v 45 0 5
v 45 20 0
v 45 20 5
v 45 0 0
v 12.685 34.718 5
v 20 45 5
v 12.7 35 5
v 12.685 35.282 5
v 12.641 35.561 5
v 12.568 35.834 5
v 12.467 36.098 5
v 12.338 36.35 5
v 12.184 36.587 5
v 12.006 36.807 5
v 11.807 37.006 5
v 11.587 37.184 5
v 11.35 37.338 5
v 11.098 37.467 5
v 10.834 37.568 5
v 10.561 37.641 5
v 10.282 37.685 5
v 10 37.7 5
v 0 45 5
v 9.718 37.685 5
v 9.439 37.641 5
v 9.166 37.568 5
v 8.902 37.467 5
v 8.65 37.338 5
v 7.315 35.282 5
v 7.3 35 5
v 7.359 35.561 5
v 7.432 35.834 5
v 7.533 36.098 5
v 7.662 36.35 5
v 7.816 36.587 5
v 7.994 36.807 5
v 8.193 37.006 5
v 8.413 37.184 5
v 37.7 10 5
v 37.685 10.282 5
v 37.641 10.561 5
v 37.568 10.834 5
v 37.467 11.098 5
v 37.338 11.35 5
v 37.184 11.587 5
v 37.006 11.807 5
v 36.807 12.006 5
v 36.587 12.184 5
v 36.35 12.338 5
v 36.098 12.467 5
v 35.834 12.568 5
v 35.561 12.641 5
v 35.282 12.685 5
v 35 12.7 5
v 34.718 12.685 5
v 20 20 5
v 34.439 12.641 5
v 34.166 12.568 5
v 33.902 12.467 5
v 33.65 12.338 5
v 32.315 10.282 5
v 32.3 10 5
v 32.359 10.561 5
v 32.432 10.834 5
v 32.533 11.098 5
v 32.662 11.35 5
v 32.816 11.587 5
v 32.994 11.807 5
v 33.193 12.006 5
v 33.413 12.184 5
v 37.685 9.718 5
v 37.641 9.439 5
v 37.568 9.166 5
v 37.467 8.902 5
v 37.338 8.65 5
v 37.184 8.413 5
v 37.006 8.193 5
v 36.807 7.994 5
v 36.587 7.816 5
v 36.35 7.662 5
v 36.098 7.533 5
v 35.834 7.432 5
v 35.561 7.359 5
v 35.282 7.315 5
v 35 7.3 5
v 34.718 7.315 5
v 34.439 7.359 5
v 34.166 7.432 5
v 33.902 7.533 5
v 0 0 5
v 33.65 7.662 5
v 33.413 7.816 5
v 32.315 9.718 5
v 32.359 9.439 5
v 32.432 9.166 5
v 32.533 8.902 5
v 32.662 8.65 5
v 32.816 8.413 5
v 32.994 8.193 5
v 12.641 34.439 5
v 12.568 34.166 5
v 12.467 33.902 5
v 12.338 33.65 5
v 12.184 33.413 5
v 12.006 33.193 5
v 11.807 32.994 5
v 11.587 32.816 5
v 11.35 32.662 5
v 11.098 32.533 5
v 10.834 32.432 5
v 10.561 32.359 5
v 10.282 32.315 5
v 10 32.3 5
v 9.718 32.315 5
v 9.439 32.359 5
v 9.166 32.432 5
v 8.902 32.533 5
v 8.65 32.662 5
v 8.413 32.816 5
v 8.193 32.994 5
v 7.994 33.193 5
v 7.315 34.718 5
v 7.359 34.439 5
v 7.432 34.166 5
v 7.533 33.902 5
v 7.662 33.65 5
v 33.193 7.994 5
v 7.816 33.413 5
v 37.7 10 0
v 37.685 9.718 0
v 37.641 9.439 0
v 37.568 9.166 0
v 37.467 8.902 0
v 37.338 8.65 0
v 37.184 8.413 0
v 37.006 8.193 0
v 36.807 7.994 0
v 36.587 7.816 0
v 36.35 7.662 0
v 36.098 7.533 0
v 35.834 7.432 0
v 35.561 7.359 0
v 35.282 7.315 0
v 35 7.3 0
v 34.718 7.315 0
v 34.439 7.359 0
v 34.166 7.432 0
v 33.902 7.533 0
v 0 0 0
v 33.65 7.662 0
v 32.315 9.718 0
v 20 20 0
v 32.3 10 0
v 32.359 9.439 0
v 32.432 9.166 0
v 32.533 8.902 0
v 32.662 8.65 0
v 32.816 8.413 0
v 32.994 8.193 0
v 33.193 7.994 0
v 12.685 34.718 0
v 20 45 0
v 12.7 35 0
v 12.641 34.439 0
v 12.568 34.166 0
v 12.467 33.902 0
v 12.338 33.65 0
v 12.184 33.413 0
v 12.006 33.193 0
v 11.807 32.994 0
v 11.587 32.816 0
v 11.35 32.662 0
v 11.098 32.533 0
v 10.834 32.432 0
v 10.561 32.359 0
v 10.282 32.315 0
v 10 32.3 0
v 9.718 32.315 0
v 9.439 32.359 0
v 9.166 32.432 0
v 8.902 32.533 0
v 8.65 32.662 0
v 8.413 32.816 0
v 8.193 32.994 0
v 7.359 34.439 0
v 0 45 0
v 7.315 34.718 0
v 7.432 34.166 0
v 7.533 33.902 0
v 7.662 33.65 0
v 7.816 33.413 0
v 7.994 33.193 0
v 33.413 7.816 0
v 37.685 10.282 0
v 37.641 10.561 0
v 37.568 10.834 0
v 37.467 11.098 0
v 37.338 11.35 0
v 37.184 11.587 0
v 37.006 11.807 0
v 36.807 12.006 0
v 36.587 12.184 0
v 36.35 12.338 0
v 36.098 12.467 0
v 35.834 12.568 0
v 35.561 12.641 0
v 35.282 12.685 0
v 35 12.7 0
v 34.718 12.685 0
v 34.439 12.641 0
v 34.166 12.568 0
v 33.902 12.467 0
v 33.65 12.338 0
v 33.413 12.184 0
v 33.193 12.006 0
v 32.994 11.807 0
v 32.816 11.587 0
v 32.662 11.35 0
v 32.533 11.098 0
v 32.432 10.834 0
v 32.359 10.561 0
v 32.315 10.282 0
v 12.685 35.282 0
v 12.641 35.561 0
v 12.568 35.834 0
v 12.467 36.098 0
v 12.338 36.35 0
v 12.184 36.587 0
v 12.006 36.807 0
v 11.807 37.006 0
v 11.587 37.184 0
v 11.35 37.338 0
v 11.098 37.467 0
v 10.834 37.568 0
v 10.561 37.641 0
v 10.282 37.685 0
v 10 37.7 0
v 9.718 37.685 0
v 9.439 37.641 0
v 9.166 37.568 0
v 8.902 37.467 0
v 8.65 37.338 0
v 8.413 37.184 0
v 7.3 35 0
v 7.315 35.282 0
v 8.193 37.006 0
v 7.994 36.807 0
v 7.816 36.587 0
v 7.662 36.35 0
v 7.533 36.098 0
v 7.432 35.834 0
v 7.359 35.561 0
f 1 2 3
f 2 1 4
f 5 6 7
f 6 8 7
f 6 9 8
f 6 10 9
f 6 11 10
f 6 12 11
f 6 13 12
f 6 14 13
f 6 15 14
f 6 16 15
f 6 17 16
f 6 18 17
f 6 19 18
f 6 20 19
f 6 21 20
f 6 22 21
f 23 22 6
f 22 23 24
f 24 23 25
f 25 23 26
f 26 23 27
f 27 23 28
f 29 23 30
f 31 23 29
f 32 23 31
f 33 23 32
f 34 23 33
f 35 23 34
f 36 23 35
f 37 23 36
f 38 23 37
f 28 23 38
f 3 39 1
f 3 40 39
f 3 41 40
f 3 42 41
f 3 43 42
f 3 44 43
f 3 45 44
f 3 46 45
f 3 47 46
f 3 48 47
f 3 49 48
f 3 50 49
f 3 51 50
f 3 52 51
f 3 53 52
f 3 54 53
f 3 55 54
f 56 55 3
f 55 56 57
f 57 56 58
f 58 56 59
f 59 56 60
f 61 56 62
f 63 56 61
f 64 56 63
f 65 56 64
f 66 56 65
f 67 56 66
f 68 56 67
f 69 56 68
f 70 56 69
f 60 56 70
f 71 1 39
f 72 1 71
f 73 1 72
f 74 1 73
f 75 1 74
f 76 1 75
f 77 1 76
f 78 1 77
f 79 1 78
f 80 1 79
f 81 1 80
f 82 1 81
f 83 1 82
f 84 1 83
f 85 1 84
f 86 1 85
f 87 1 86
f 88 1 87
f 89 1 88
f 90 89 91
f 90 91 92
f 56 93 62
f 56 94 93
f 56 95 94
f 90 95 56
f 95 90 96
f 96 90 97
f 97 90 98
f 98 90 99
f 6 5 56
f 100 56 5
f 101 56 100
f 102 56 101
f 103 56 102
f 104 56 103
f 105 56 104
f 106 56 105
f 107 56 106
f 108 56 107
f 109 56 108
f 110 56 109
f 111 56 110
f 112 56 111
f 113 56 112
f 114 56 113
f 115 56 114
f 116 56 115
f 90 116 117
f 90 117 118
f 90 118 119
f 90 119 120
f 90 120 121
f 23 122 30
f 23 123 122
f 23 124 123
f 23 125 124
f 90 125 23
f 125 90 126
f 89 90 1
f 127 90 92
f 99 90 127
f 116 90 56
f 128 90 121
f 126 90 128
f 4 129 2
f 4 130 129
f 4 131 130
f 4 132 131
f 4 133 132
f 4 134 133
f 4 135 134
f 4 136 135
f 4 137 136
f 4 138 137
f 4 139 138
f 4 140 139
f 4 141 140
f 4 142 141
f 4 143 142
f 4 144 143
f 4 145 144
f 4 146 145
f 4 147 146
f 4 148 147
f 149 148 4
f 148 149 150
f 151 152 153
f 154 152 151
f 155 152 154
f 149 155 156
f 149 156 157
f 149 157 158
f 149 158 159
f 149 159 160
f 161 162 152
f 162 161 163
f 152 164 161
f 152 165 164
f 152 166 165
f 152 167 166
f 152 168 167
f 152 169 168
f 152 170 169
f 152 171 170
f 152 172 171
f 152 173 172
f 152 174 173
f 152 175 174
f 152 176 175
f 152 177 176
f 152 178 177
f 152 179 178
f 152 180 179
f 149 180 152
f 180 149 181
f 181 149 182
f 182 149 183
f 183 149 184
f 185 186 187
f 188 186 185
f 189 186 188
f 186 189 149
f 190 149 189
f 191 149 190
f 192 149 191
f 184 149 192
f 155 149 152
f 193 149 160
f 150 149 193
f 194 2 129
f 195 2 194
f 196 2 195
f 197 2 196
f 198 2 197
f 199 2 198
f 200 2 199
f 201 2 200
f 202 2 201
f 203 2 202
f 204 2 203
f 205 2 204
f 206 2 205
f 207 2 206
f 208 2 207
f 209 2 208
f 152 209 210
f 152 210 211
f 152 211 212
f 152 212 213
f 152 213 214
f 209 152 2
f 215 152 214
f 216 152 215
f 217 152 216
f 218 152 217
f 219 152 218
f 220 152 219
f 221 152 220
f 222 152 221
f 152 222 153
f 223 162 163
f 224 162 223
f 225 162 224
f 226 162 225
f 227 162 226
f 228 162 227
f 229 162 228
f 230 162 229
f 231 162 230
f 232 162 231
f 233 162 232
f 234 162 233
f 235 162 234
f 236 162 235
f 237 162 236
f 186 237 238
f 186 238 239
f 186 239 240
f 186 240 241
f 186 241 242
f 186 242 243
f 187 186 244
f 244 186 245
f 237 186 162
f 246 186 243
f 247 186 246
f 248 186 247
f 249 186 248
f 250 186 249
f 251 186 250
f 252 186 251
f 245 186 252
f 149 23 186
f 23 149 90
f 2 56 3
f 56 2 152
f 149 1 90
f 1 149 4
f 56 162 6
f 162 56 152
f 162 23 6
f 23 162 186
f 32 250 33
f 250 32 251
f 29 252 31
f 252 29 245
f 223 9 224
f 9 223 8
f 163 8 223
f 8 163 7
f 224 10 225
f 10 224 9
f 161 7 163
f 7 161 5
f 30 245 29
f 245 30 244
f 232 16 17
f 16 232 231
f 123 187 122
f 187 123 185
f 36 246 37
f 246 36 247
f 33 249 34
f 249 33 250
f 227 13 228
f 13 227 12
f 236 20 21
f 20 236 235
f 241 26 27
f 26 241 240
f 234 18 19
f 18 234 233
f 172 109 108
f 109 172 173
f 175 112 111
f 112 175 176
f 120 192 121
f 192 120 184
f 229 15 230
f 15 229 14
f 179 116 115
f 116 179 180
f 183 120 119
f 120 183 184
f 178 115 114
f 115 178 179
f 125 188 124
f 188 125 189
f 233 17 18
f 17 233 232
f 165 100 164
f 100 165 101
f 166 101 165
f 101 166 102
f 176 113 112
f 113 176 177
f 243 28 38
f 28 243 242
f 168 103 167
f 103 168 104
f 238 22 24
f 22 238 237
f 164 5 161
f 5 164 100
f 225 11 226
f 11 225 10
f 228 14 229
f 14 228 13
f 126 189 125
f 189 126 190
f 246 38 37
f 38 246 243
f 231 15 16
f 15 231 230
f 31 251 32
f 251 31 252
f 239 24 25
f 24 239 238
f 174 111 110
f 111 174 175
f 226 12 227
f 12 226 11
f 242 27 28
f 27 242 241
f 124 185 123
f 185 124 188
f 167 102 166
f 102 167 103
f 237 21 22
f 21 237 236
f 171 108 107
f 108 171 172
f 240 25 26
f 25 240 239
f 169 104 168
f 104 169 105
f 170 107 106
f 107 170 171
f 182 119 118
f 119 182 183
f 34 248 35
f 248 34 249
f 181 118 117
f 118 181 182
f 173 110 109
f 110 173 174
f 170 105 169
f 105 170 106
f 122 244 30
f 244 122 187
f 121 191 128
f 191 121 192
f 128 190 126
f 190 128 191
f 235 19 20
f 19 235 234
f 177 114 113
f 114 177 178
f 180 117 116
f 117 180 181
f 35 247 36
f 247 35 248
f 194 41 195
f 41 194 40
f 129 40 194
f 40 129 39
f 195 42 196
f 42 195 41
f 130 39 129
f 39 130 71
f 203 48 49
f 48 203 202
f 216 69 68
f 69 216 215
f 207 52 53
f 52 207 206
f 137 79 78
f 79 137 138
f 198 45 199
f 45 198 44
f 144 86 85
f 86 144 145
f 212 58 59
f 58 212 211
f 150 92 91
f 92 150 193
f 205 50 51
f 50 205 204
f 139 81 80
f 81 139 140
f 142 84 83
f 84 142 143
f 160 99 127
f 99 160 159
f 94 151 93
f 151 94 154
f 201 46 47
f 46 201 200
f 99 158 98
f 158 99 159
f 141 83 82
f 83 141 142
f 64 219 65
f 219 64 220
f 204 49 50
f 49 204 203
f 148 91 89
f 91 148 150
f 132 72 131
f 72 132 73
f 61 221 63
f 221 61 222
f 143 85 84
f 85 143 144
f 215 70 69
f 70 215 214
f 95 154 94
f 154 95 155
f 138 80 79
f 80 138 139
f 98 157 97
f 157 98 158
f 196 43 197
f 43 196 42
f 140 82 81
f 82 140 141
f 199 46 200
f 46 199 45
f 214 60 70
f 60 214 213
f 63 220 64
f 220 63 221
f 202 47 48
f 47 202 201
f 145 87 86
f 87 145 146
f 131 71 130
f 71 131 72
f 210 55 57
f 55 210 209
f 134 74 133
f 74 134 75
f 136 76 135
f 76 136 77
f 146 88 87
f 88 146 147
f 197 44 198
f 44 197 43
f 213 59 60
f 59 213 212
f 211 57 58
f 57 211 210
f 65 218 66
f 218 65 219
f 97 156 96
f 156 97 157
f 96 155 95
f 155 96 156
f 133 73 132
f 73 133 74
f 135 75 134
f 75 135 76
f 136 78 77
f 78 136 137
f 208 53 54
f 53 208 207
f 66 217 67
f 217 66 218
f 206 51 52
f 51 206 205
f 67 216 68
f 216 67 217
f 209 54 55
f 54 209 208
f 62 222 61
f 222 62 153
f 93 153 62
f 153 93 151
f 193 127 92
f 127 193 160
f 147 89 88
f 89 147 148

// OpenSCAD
// Flat 90-degree corner plate.
$fn = 60;
eps = 0.02;
arm = 45;
width = 20;
plate_t = 5;
difference() {
    union() { cube([arm, width, plate_t]); cube([width, arm, plate_t]); }
    for (p = [[width / 2, arm - width / 2], [arm - width / 2, width / 2]])
        translate([p[0], p[1], -eps]) cylinder(d = 5.4, h = plate_t + 2 * eps);
}
